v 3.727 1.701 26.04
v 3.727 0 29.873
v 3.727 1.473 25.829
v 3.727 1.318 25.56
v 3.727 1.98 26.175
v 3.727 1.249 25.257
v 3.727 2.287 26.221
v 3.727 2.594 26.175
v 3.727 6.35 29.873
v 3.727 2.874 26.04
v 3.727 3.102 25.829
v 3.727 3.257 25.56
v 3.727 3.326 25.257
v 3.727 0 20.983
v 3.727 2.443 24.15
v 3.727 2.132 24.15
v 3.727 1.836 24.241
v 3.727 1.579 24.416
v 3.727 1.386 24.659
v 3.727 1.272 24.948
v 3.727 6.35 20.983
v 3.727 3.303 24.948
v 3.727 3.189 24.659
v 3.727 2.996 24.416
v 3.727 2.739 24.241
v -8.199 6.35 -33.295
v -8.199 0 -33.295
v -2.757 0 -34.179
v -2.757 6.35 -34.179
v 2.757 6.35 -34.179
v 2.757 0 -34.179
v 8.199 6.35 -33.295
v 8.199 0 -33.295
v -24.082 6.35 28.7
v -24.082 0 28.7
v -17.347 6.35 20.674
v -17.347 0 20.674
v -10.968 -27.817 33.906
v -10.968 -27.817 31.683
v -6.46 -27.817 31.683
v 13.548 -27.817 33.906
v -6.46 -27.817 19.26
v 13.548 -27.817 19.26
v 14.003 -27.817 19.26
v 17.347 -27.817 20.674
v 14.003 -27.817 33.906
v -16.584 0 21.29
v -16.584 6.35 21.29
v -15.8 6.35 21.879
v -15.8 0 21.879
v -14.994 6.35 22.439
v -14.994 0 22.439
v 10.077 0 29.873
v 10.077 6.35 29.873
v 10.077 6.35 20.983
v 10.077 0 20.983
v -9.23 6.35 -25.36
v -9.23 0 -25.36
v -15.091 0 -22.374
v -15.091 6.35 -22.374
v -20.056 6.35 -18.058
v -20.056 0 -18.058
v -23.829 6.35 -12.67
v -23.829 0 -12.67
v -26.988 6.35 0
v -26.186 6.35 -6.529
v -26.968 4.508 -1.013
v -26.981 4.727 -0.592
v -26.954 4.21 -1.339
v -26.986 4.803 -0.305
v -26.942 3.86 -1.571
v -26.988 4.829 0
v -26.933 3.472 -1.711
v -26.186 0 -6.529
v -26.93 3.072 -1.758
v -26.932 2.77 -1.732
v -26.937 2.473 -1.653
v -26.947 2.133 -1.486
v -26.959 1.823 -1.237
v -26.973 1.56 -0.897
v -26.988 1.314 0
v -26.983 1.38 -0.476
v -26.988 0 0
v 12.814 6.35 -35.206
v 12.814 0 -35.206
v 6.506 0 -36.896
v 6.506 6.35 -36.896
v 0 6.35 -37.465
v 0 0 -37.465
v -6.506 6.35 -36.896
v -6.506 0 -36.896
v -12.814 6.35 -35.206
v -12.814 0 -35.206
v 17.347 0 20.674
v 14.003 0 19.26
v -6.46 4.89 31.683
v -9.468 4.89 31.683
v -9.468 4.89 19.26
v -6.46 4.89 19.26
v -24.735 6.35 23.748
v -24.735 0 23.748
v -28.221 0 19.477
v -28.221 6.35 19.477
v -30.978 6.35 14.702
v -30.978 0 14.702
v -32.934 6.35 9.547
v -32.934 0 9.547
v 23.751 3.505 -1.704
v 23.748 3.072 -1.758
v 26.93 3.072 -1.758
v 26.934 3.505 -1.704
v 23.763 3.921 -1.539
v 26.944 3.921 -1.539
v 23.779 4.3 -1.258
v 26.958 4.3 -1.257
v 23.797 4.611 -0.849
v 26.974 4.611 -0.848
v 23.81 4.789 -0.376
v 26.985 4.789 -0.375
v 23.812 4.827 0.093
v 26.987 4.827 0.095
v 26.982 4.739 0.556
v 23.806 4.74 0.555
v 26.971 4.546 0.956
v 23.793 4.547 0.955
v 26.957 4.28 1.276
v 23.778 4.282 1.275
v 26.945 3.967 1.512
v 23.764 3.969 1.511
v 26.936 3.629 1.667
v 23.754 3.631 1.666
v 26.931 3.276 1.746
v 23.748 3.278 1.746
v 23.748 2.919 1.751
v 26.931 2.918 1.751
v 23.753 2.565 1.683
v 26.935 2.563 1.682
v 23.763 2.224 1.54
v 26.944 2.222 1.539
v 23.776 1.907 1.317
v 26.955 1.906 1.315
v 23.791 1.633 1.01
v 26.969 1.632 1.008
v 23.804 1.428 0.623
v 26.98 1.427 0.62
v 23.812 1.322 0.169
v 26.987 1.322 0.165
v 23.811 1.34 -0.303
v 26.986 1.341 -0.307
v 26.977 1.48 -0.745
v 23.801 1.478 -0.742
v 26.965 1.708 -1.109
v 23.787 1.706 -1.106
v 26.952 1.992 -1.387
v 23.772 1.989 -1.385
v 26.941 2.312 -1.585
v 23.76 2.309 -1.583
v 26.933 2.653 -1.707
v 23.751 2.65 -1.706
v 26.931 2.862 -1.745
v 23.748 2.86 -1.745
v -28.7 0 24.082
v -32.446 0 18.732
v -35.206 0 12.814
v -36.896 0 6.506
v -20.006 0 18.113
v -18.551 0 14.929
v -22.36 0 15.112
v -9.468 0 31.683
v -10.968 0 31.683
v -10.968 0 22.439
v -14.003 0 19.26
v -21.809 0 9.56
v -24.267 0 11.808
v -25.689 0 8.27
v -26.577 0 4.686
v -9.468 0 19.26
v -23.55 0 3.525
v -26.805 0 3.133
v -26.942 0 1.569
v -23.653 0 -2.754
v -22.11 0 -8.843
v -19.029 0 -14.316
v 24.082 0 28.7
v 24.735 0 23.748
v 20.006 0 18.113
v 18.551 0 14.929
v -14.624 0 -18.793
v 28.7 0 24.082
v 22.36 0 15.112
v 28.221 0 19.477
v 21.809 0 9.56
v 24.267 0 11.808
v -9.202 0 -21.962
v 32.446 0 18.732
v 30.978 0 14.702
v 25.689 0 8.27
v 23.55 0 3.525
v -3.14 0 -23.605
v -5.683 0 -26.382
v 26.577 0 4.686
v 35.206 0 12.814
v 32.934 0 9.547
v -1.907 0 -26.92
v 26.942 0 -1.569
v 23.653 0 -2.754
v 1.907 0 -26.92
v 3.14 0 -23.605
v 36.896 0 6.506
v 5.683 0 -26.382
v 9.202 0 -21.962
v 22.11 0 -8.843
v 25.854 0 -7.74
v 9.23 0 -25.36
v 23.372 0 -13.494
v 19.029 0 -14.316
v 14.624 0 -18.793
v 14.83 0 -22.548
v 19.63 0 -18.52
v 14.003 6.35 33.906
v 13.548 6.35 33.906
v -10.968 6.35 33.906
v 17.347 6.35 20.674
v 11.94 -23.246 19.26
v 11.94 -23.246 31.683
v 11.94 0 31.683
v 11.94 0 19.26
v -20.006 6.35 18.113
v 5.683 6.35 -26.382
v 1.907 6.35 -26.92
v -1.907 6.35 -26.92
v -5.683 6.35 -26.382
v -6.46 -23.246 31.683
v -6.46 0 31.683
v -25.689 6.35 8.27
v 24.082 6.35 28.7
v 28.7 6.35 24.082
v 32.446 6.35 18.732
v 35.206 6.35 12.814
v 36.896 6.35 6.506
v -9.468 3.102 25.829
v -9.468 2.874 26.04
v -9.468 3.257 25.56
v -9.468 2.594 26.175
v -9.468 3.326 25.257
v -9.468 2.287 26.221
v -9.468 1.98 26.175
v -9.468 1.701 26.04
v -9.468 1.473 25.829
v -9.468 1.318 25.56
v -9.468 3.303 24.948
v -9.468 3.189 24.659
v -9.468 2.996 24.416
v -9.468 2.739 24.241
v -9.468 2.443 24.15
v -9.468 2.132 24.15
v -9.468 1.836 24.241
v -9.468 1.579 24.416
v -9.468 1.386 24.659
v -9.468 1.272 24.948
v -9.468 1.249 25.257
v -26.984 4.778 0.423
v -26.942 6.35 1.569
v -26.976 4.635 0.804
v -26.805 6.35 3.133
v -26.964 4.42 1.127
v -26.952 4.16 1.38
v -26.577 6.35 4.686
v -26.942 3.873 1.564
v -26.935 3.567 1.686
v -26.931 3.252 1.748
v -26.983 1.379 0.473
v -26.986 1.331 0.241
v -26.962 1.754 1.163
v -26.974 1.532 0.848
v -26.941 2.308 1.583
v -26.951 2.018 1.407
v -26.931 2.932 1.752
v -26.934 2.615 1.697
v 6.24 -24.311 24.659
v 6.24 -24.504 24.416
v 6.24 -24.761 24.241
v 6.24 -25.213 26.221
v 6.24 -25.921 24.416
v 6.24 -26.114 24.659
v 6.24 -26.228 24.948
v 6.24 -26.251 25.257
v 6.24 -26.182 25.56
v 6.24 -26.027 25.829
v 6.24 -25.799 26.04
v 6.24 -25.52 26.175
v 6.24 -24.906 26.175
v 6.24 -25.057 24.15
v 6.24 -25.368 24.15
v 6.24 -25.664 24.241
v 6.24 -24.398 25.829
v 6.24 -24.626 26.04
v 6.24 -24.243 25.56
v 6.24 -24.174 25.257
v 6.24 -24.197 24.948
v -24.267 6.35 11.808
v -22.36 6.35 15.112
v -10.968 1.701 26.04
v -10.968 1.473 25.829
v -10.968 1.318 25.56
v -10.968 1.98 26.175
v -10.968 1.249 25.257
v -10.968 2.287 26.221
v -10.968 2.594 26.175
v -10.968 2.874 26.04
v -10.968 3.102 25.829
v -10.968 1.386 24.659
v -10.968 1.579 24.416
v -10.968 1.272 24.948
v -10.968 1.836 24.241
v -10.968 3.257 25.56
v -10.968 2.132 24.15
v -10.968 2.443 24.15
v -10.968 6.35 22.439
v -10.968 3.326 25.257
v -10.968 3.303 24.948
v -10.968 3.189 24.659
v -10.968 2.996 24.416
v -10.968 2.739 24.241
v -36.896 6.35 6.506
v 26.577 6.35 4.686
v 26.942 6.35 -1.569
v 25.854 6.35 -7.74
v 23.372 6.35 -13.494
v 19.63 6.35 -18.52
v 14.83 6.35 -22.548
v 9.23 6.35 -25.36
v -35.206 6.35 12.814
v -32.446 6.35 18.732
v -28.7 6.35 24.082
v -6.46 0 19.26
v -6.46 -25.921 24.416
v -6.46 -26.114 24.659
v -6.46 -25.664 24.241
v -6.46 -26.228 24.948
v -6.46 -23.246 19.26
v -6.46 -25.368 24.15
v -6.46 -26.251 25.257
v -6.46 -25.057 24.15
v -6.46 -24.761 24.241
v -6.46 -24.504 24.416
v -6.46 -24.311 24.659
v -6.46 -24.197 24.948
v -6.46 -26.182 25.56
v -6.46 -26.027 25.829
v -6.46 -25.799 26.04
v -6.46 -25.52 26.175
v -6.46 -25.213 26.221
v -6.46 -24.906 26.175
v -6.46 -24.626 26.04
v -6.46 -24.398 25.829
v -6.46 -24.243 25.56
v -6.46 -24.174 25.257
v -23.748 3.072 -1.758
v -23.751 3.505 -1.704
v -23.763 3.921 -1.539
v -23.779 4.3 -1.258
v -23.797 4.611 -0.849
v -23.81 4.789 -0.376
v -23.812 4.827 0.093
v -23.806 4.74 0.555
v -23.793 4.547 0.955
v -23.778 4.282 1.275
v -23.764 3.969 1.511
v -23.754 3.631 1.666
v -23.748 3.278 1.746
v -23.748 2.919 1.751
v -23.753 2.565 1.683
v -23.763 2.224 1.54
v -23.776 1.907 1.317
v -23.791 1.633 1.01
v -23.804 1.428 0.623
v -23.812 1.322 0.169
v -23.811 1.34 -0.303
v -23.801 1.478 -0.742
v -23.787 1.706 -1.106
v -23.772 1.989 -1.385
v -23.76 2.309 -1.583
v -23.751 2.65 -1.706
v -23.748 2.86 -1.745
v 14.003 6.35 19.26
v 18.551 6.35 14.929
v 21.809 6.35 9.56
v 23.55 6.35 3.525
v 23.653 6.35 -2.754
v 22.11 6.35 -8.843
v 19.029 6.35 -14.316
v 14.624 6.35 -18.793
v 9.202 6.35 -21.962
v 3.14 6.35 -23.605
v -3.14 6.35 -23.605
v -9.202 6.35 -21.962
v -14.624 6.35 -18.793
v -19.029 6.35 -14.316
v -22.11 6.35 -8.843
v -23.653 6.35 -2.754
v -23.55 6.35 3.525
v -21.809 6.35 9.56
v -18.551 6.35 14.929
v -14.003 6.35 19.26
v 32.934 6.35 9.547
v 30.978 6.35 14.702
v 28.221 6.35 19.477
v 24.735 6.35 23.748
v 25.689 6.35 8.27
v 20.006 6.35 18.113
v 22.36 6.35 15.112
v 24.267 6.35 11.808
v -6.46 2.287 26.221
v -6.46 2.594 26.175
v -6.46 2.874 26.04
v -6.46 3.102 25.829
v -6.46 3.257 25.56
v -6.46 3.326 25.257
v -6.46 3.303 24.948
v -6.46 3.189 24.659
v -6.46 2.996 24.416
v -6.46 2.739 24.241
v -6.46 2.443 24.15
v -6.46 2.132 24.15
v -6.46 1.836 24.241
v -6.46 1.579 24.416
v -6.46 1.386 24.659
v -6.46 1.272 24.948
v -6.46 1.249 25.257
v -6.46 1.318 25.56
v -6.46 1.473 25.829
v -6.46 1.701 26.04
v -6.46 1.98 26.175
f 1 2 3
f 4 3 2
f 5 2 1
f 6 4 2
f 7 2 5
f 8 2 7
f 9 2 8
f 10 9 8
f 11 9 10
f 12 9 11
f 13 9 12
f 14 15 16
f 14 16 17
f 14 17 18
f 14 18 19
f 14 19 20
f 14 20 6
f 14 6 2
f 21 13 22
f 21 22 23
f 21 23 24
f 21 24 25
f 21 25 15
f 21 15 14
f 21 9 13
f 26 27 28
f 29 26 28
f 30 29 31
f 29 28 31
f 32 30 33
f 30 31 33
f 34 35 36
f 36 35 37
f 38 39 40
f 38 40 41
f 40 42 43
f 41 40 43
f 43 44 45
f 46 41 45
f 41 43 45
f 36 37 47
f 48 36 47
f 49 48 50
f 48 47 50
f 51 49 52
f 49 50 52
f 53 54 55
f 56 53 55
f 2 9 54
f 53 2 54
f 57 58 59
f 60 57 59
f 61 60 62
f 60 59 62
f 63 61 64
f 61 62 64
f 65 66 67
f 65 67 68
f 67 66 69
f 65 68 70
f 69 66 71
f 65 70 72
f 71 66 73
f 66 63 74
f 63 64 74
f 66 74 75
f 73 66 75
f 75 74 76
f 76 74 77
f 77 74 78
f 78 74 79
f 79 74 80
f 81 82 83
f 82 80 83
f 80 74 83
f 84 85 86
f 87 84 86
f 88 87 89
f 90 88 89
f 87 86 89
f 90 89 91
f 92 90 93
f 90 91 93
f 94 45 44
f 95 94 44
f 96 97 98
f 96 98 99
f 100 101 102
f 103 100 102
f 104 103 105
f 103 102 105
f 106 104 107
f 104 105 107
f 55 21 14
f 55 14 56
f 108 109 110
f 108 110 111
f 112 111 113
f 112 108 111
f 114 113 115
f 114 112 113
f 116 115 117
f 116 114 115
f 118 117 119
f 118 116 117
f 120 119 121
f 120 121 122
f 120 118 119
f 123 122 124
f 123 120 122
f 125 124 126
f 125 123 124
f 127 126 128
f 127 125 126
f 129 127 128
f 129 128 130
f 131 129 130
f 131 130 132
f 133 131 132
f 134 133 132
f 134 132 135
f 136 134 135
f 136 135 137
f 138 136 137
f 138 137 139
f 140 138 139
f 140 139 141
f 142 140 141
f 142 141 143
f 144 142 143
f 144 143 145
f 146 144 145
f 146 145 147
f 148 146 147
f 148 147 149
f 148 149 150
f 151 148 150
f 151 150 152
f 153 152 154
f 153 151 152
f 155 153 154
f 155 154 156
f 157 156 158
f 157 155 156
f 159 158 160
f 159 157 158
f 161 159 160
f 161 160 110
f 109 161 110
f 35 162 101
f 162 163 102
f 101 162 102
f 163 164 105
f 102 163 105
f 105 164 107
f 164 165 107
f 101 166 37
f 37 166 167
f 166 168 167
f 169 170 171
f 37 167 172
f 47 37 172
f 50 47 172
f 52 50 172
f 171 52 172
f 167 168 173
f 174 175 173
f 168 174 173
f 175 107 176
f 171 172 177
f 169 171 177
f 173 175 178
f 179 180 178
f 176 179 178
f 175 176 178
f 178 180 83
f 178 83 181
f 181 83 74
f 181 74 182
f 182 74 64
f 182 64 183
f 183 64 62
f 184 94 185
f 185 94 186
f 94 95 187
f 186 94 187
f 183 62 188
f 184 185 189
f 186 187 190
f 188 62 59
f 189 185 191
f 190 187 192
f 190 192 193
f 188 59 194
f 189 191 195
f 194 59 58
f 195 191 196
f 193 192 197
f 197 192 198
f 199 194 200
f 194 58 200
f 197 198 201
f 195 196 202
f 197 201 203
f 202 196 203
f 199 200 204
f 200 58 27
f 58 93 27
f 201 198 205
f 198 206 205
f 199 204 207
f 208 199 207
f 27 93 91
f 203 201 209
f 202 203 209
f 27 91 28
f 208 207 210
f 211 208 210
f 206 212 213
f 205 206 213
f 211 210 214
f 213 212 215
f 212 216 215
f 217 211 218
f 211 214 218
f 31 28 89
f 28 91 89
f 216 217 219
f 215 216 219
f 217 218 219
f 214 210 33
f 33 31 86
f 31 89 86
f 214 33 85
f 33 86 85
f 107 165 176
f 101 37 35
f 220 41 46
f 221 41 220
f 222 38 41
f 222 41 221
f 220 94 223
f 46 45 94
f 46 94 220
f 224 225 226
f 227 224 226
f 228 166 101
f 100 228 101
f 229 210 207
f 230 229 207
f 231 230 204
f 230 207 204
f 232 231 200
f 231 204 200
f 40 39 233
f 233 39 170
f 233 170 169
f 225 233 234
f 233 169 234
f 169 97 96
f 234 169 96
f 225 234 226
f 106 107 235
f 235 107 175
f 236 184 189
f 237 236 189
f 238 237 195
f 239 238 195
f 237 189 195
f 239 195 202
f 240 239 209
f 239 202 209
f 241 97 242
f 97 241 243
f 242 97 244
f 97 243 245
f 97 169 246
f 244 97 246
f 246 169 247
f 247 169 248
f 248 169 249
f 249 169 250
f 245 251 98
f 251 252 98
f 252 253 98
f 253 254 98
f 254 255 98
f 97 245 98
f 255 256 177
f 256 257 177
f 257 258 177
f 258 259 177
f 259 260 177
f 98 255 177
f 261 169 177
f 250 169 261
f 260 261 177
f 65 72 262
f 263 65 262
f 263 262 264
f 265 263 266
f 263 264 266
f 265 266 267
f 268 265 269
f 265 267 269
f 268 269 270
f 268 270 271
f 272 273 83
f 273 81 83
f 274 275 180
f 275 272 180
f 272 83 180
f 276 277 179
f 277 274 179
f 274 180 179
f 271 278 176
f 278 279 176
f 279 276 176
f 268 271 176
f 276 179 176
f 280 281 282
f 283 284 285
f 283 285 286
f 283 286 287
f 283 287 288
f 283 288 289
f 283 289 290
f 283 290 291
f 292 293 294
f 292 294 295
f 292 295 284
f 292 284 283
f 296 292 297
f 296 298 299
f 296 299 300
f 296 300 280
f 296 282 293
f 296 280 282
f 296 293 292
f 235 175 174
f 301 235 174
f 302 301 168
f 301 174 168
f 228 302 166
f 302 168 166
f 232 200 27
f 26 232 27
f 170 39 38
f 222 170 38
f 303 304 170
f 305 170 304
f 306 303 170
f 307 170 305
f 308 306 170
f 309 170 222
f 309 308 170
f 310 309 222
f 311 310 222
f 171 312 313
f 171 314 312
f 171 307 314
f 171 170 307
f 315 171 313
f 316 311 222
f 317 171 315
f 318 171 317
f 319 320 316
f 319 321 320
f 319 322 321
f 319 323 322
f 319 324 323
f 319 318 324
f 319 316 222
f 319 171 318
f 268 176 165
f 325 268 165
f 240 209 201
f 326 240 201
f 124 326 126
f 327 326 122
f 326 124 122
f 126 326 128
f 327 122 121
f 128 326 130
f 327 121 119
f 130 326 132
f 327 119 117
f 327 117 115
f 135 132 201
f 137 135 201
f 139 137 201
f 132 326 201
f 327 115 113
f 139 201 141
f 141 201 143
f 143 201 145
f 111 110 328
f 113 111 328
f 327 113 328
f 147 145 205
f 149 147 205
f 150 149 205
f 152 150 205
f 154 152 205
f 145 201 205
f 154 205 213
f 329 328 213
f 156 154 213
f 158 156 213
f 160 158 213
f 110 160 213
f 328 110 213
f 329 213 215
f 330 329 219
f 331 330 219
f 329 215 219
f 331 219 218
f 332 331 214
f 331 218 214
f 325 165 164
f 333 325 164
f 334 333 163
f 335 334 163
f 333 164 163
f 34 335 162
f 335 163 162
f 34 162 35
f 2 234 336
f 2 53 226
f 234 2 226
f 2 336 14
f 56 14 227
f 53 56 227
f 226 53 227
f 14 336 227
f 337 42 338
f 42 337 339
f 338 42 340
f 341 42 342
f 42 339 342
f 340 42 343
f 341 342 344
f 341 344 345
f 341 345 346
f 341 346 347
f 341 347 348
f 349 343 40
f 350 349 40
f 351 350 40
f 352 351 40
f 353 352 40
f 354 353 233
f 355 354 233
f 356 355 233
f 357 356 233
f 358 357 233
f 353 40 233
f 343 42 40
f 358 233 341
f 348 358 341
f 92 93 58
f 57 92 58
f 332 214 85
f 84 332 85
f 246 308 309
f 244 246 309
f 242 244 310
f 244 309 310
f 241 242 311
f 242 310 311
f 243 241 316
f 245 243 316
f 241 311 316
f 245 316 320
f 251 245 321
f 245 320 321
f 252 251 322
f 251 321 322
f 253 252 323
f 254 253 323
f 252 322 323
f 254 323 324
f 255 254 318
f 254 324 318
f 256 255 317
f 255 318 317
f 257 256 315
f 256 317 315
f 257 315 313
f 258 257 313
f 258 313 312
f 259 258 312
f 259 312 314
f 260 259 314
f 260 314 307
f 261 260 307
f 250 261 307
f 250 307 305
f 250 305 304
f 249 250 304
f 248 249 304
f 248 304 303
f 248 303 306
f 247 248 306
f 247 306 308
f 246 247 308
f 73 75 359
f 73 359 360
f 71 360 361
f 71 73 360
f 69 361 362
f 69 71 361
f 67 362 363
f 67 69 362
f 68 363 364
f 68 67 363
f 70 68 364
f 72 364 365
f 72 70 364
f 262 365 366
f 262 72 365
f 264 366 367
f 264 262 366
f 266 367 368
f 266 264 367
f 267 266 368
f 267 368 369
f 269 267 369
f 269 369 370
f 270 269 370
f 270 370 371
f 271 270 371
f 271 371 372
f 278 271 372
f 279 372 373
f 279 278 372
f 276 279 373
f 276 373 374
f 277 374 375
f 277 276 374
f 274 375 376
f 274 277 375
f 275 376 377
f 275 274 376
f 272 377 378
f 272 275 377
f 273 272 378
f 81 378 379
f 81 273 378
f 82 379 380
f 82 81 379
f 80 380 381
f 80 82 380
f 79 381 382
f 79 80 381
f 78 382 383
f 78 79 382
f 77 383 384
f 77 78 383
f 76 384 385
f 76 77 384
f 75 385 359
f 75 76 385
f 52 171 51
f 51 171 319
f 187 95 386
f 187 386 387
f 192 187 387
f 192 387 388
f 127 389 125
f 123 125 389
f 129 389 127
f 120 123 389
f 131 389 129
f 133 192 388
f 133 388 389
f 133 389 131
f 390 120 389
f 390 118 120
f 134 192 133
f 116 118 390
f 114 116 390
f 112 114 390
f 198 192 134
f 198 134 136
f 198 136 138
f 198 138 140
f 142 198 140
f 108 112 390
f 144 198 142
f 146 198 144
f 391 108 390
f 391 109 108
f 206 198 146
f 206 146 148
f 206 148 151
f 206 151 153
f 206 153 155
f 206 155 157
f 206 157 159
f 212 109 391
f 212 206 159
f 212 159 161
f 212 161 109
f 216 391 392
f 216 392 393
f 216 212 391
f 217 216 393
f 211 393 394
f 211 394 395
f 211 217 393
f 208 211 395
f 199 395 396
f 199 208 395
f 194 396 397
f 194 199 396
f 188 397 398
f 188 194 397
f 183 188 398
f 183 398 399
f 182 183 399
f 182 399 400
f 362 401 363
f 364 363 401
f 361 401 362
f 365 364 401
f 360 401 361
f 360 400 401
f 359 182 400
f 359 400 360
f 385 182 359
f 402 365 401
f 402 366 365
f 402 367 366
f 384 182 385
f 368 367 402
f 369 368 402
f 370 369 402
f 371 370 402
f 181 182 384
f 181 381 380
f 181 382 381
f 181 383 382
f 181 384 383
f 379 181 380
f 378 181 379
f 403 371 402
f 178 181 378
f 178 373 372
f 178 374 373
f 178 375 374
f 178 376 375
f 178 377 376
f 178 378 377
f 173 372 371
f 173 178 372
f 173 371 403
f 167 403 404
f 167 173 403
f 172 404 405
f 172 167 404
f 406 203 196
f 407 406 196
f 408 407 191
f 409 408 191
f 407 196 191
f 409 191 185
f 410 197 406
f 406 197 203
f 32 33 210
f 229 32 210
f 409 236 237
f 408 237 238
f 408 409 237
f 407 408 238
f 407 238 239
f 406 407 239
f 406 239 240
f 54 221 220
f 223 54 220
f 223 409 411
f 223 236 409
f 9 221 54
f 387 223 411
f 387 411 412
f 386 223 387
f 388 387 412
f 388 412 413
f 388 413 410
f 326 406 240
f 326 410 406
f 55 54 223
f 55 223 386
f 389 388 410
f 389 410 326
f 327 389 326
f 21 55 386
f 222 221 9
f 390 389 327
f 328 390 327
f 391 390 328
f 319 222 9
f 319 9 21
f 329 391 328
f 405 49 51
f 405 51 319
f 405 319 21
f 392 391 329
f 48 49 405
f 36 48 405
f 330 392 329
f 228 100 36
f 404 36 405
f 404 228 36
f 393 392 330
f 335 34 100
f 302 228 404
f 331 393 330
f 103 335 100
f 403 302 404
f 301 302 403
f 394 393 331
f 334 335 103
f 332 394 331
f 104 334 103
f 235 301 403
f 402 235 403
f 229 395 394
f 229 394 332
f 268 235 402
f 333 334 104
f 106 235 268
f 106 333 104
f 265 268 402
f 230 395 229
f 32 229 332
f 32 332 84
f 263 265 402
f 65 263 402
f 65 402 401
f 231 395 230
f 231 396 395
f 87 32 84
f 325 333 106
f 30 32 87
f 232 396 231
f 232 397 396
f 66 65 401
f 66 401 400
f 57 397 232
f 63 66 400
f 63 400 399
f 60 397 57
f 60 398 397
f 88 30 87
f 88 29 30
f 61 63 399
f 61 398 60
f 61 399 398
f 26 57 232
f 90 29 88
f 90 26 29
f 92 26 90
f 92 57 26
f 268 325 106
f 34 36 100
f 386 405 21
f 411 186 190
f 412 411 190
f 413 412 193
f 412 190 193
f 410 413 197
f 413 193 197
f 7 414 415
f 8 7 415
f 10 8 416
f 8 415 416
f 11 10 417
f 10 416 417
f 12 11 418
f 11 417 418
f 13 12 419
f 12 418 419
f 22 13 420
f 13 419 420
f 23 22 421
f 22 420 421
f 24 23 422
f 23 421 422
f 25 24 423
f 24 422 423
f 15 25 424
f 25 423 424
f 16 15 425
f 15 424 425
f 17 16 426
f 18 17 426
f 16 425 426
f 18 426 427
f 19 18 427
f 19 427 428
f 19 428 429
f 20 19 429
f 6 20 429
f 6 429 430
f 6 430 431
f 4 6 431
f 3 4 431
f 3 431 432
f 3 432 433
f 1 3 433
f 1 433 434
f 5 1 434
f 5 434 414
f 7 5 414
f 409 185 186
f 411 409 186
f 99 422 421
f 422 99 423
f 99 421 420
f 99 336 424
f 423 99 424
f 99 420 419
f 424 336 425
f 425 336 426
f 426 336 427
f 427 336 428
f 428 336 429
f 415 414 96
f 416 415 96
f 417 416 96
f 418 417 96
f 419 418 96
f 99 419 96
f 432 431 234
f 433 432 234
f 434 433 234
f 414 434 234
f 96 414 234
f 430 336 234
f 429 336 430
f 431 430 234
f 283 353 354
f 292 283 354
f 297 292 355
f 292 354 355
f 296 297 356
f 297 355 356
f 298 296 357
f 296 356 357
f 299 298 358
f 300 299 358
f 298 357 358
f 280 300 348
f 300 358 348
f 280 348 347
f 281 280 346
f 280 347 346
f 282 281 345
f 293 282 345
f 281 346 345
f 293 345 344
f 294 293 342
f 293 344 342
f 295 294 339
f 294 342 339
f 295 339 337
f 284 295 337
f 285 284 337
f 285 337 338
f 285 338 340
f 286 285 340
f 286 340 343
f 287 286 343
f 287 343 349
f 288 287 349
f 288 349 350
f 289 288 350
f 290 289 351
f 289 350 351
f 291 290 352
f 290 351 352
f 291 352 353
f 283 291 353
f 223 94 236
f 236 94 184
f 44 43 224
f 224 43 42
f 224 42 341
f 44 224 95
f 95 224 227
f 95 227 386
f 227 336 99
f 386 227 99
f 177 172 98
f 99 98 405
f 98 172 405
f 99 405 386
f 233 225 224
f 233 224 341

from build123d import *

# Parameters (mm, degrees)
SKETCH1_R               = 23.8125
BOSS_EXTRUDE1_DEPTH     = 6.35
CUT_EXTRUDE1_DEPTH      = 53.964614985
CUT_EXTRUDE1_DEPTH_BACK = 53.964614985
SKETCH4_R               = 1.75768
BOSS_EXTRUDE3_START     = -6.35
BOSS_EXTRUDE3_DEPTH     = 6.35
SKETCH13_W              = 24.51582
SKETCH13_H              = 34.16660521
BOSS_EXTRUDE7_DEPTH     = 2.2225
SKETCH14_W              = 18.4
SKETCH14_H              = 4.571
BOSS_EXTRUDE8_DEPTH     = 12.423266239
SKETCH19_W              = 1.60782
SKETCH19_H              = 34.16660521
BOSS_EXTRUDE14_DEPTH    = 12.423266239
SKETCH20_W              = 14.645766239
SKETCH20_H              = 34.16660521
BOSS_EXTRUDE15_DEPTH    = 0.455043
CUT_EXTRUDE2_DEPTH      = 4.8895
SKETCH25_W              = 11.467193476
SKETCH25_H              = 6.35
CUT_EXTRUDE3_DEPTH      = 4.7625
SKETCH23_R              = 1.0414
CUT_EXTRUDE4_DEPTH      = 17.78
SKETCH27_R              = 1.0414
CUT_EXTRUDE5_DEPTH      = 12.7
BOSS_EXTRUDE17_START    = -34.16660521
BOSS_EXTRUDE17_DEPTH    = 34.16660521
SKETCH31_W              = 6.35
SKETCH31_H              = 8.89
CUT_EXTRUDE6_DEPTH      = 7.874


with BuildPart() as part:
    # Sketch1 → Boss-Extrude1 (new body)
    with BuildSketch(Plane(origin=(0, 0, 0), x_dir=(1, 0, 0), z_dir=(0, 1, 0))):
        with BuildLine():
            Line((-26.577499234, -4.686330195), (-36.895822467, -6.505728976))
            ThreePointArc((-36.895822467, -6.505728976), (-32.445641753, -18.7325), (-24.082037797, -28.699855061))
            Line((-24.082037797, -28.699855061), (-17.347230616, -20.673624409))
            ThreePointArc((-17.347230616, -20.673624409), (0, -26.9875), (17.347230616, -20.673624409))
            Line((17.347230616, -20.673624409), (24.082037797, -28.699855061))
            ThreePointArc((24.082037797, -28.699855061), (32.445641753, -18.7325), (36.895822467, -6.505728976))
            Line((36.895822467, -6.505728976), (26.577499234, -4.686330195))
            ThreePointArc((26.577499234, -4.686330195), (23.371860585, 13.49375), (9.230268618, 25.359954603))
            Line((9.230268618, 25.359954603), (12.81378467, 35.205584038))
            ThreePointArc((12.81378467, 35.205584038), (0, 37.465), (-12.81378467, 35.205584038))
            Line((-12.81378467, 35.205584038), (-9.230268618, 25.359954603))
            ThreePointArc((-9.230268618, 25.359954603), (-22.106865795, 15.479394076), (-26.9875, 0))
            ThreePointArc((-26.9875, 0), (-26.884804415, -2.352115607), (-26.577499234, -4.686330195))
        make_face()
        with BuildLine():
            ThreePointArc((20.006273745, -18.112817756), (23.371860585, -13.49375), (25.689297184, -8.269532421))
            Line((25.689297184, -8.269532421), (32.934160714, -9.546997332))
            ThreePointArc((32.934160714, -9.546997332), (29.696011096, -17.145), (24.735022577, -23.748321164))
            Line((24.735022577, -23.748321164), (20.006273745, -18.112817756))
        make_face(mode=Mode.SUBTRACT)
        with BuildLine():
            Line((-32.934160714, -9.546997332), (-25.689297184, -8.269532421))
            ThreePointArc((-25.689297184, -8.269532421), (-23.371860585, -13.49375), (-20.006273745, -18.112817756))
            Line((-20.006273745, -18.112817756), (-24.735022577, -23.748321164))
            ThreePointArc((-24.735022577, -23.748321164), (-29.696011096, -17.145), (-32.934160714, -9.546997332))
        make_face(mode=Mode.SUBTRACT)
        with Locations(Location((0, 0, 0), (0, 0, 270))):
            Circle(SKETCH1_R, mode=Mode.SUBTRACT)
        with BuildLine():
            ThreePointArc((-8.199138137, 33.295318497), (0, 34.29), (8.199138137, 33.295318497))
            Line((8.199138137, 33.295318497), (5.683023438, 26.382350177))
            ThreePointArc((5.683023438, 26.382350177), (0, 26.9875), (-5.683023438, 26.382350177))
            Line((-5.683023438, 26.382350177), (-8.199138137, 33.295318497))
        make_face(mode=Mode.SUBTRACT)
    extrude(amount=BOSS_EXTRUDE1_DEPTH)

    # Sketch4 → Cut-Extrude1 (cut, two sides: drawn at the far end of the back side and taken through both)
    with BuildSketch(Plane(origin=(0, 0, 0), x_dir=(0, 0, -1), z_dir=(1, 0, 0)).offset(-CUT_EXTRUDE1_DEPTH_BACK)):
        with Locations((0, 3.071710122)):
            Circle(SKETCH4_R)
    extrude(amount=CUT_EXTRUDE1_DEPTH + CUT_EXTRUDE1_DEPTH_BACK, mode=Mode.SUBTRACT)

    # Sketch7 → Boss-Extrude3 (add)
    with BuildSketch(Plane(origin=(0, 6.35, 0), x_dir=(1, 0, 0), z_dir=(0, 1, 0)).offset(BOSS_EXTRUDE3_START)):
        with BuildLine():
            Line((11.940053077, -31.683419289), (11.940053077, -24.202485177))
            ThreePointArc((11.940053077, -24.202485177), (0.536822134, -26.98216037), (-10.967946923, -24.658250071))
            Line((-10.967946923, -24.658250071), (-10.967946923, -31.683419289))
            Line((-10.967946923, -31.683419289), (11.940053077, -31.683419289))
        make_face()
        with BuildLine():
            ThreePointArc((-14.002916152, -19.26015305), (0, -23.8125), (14.002916152, -19.26015305))
            Line((14.002916152, -19.26015305), (-14.002916152, -19.26015305))
        make_face()
    extrude(amount=BOSS_EXTRUDE3_DEPTH)

    # Sketch13 → Boss-Extrude7 (add)
    with BuildSketch(Plane.XY.offset(31.683419289)):
        with Locations((1.289963077, -10.733302605)):
            Rectangle(SKETCH13_W, SKETCH13_H)
    extrude(amount=BOSS_EXTRUDE7_DEPTH)

    # Sketch14 → Boss-Extrude8 (add)
    with BuildSketch(Plane(origin=(0, 0, 31.683419289), x_dir=(-1, 0, 0), z_dir=(0, 0, -1))):
        with Locations((-2.740053077, -25.53110521)):
            Rectangle(SKETCH14_W, SKETCH14_H)
    extrude(amount=BOSS_EXTRUDE8_DEPTH)

    # Sketch19 → Boss-Extrude14 (add)
    with BuildSketch(Plane(origin=(0, 0, 31.683419289), x_dir=(-1, 0, 0), z_dir=(0, 0, -1))):
        with Locations((-12.743963077, -10.733302605)):
            Rectangle(SKETCH19_W, SKETCH19_H)
    extrude(amount=BOSS_EXTRUDE14_DEPTH)

    # Sketch20 → Boss-Extrude15 (add)
    with BuildSketch(Plane(origin=(13.547873077, 0, 0), x_dir=(0, 0, -1), z_dir=(1, 0, 0))):
        with Locations((-26.58303617, -10.733302605)):
            Rectangle(SKETCH20_W, SKETCH20_H)
    extrude(amount=BOSS_EXTRUDE15_DEPTH)

    # Sketch21 → Cut-Extrude2 (cut)
    with BuildSketch(Plane.XZ):
        Polygon((-6.459946923, 19.26015305), (-6.459946923, 30.299813914), (-6.459946923, 31.683419289), (-9.467946923, 31.683419289), (-9.467946923, 30.629419289), (-9.467946923, 19.26015305), align=None)
    extrude(amount=-CUT_EXTRUDE2_DEPTH, mode=Mode.SUBTRACT)

    # Sketch25 → Cut-Extrude3 (cut)
    with BuildSketch(Plane.ZY.offset(10.967946923)):
        with Locations((28.172322551, 3.175)):
            Rectangle(SKETCH25_W, SKETCH25_H)
    extrude(amount=CUT_EXTRUDE3_DEPTH, mode=Mode.SUBTRACT)

    # Sketch23 → Cut-Extrude4 (cut)
    with BuildSketch(Plane.ZY.offset(10.967946923)):
        with Locations((25.179419289, 2.28739479)):
            Circle(SKETCH23_R)
    extrude(amount=-CUT_EXTRUDE4_DEPTH, mode=Mode.SUBTRACT)

    # Sketch27 → Cut-Extrude5 (cut)
    with BuildSketch(Plane.ZY.offset(6.459946923)):
        with Locations((25.179419289, -25.21260521)):
            Circle(SKETCH27_R)
    extrude(amount=-CUT_EXTRUDE5_DEPTH, mode=Mode.SUBTRACT)

    # Sketch29 → Boss-Extrude17 (add)
    with BuildSketch(Plane(origin=(0, 6.35, 0), x_dir=(1, 0, 0), z_dir=(0, 1, 0)).offset(BOSS_EXTRUDE17_START)):
        with BuildLine():
            Line((17.347230616, -20.673624409), (14.002916152, -19.26015305))
            Line((14.002916152, -19.26015305), (14.002916152, -20.673624409))
            Line((14.002916152, -20.673624409), (14.002916152, -20.706319513))
            Line((14.002916152, -20.706319513), (14.002916152, -23.07040302))
            ThreePointArc((14.002916152, -23.07040302), (15.720816217, -21.935840392), (17.347230616, -20.673624409))
        make_face()
        with BuildLine():
            Line((17.347230616, -20.673624409), (14.002916152, -33.905919289))
            Line((14.002916152, -33.905919289), (14.002916152, -23.07040302))
            ThreePointArc((14.002916152, -23.07040302), (15.720816217, -21.935840392), (17.347230616, -20.673624409))
        make_face()
    extrude(amount=BOSS_EXTRUDE17_DEPTH)

    # Sketch31 → Cut-Extrude6 (cut)
    with BuildSketch(Plane(origin=(0, 6.35, 0), x_dir=(1, 0, 0), z_dir=(0, 1, 0))):
        with Locations((6.901888069, -25.428029678)):
            Rectangle(SKETCH31_W, SKETCH31_H)
    extrude(amount=-CUT_EXTRUDE6_DEPTH, mode=Mode.SUBTRACT)


solid = part.part
